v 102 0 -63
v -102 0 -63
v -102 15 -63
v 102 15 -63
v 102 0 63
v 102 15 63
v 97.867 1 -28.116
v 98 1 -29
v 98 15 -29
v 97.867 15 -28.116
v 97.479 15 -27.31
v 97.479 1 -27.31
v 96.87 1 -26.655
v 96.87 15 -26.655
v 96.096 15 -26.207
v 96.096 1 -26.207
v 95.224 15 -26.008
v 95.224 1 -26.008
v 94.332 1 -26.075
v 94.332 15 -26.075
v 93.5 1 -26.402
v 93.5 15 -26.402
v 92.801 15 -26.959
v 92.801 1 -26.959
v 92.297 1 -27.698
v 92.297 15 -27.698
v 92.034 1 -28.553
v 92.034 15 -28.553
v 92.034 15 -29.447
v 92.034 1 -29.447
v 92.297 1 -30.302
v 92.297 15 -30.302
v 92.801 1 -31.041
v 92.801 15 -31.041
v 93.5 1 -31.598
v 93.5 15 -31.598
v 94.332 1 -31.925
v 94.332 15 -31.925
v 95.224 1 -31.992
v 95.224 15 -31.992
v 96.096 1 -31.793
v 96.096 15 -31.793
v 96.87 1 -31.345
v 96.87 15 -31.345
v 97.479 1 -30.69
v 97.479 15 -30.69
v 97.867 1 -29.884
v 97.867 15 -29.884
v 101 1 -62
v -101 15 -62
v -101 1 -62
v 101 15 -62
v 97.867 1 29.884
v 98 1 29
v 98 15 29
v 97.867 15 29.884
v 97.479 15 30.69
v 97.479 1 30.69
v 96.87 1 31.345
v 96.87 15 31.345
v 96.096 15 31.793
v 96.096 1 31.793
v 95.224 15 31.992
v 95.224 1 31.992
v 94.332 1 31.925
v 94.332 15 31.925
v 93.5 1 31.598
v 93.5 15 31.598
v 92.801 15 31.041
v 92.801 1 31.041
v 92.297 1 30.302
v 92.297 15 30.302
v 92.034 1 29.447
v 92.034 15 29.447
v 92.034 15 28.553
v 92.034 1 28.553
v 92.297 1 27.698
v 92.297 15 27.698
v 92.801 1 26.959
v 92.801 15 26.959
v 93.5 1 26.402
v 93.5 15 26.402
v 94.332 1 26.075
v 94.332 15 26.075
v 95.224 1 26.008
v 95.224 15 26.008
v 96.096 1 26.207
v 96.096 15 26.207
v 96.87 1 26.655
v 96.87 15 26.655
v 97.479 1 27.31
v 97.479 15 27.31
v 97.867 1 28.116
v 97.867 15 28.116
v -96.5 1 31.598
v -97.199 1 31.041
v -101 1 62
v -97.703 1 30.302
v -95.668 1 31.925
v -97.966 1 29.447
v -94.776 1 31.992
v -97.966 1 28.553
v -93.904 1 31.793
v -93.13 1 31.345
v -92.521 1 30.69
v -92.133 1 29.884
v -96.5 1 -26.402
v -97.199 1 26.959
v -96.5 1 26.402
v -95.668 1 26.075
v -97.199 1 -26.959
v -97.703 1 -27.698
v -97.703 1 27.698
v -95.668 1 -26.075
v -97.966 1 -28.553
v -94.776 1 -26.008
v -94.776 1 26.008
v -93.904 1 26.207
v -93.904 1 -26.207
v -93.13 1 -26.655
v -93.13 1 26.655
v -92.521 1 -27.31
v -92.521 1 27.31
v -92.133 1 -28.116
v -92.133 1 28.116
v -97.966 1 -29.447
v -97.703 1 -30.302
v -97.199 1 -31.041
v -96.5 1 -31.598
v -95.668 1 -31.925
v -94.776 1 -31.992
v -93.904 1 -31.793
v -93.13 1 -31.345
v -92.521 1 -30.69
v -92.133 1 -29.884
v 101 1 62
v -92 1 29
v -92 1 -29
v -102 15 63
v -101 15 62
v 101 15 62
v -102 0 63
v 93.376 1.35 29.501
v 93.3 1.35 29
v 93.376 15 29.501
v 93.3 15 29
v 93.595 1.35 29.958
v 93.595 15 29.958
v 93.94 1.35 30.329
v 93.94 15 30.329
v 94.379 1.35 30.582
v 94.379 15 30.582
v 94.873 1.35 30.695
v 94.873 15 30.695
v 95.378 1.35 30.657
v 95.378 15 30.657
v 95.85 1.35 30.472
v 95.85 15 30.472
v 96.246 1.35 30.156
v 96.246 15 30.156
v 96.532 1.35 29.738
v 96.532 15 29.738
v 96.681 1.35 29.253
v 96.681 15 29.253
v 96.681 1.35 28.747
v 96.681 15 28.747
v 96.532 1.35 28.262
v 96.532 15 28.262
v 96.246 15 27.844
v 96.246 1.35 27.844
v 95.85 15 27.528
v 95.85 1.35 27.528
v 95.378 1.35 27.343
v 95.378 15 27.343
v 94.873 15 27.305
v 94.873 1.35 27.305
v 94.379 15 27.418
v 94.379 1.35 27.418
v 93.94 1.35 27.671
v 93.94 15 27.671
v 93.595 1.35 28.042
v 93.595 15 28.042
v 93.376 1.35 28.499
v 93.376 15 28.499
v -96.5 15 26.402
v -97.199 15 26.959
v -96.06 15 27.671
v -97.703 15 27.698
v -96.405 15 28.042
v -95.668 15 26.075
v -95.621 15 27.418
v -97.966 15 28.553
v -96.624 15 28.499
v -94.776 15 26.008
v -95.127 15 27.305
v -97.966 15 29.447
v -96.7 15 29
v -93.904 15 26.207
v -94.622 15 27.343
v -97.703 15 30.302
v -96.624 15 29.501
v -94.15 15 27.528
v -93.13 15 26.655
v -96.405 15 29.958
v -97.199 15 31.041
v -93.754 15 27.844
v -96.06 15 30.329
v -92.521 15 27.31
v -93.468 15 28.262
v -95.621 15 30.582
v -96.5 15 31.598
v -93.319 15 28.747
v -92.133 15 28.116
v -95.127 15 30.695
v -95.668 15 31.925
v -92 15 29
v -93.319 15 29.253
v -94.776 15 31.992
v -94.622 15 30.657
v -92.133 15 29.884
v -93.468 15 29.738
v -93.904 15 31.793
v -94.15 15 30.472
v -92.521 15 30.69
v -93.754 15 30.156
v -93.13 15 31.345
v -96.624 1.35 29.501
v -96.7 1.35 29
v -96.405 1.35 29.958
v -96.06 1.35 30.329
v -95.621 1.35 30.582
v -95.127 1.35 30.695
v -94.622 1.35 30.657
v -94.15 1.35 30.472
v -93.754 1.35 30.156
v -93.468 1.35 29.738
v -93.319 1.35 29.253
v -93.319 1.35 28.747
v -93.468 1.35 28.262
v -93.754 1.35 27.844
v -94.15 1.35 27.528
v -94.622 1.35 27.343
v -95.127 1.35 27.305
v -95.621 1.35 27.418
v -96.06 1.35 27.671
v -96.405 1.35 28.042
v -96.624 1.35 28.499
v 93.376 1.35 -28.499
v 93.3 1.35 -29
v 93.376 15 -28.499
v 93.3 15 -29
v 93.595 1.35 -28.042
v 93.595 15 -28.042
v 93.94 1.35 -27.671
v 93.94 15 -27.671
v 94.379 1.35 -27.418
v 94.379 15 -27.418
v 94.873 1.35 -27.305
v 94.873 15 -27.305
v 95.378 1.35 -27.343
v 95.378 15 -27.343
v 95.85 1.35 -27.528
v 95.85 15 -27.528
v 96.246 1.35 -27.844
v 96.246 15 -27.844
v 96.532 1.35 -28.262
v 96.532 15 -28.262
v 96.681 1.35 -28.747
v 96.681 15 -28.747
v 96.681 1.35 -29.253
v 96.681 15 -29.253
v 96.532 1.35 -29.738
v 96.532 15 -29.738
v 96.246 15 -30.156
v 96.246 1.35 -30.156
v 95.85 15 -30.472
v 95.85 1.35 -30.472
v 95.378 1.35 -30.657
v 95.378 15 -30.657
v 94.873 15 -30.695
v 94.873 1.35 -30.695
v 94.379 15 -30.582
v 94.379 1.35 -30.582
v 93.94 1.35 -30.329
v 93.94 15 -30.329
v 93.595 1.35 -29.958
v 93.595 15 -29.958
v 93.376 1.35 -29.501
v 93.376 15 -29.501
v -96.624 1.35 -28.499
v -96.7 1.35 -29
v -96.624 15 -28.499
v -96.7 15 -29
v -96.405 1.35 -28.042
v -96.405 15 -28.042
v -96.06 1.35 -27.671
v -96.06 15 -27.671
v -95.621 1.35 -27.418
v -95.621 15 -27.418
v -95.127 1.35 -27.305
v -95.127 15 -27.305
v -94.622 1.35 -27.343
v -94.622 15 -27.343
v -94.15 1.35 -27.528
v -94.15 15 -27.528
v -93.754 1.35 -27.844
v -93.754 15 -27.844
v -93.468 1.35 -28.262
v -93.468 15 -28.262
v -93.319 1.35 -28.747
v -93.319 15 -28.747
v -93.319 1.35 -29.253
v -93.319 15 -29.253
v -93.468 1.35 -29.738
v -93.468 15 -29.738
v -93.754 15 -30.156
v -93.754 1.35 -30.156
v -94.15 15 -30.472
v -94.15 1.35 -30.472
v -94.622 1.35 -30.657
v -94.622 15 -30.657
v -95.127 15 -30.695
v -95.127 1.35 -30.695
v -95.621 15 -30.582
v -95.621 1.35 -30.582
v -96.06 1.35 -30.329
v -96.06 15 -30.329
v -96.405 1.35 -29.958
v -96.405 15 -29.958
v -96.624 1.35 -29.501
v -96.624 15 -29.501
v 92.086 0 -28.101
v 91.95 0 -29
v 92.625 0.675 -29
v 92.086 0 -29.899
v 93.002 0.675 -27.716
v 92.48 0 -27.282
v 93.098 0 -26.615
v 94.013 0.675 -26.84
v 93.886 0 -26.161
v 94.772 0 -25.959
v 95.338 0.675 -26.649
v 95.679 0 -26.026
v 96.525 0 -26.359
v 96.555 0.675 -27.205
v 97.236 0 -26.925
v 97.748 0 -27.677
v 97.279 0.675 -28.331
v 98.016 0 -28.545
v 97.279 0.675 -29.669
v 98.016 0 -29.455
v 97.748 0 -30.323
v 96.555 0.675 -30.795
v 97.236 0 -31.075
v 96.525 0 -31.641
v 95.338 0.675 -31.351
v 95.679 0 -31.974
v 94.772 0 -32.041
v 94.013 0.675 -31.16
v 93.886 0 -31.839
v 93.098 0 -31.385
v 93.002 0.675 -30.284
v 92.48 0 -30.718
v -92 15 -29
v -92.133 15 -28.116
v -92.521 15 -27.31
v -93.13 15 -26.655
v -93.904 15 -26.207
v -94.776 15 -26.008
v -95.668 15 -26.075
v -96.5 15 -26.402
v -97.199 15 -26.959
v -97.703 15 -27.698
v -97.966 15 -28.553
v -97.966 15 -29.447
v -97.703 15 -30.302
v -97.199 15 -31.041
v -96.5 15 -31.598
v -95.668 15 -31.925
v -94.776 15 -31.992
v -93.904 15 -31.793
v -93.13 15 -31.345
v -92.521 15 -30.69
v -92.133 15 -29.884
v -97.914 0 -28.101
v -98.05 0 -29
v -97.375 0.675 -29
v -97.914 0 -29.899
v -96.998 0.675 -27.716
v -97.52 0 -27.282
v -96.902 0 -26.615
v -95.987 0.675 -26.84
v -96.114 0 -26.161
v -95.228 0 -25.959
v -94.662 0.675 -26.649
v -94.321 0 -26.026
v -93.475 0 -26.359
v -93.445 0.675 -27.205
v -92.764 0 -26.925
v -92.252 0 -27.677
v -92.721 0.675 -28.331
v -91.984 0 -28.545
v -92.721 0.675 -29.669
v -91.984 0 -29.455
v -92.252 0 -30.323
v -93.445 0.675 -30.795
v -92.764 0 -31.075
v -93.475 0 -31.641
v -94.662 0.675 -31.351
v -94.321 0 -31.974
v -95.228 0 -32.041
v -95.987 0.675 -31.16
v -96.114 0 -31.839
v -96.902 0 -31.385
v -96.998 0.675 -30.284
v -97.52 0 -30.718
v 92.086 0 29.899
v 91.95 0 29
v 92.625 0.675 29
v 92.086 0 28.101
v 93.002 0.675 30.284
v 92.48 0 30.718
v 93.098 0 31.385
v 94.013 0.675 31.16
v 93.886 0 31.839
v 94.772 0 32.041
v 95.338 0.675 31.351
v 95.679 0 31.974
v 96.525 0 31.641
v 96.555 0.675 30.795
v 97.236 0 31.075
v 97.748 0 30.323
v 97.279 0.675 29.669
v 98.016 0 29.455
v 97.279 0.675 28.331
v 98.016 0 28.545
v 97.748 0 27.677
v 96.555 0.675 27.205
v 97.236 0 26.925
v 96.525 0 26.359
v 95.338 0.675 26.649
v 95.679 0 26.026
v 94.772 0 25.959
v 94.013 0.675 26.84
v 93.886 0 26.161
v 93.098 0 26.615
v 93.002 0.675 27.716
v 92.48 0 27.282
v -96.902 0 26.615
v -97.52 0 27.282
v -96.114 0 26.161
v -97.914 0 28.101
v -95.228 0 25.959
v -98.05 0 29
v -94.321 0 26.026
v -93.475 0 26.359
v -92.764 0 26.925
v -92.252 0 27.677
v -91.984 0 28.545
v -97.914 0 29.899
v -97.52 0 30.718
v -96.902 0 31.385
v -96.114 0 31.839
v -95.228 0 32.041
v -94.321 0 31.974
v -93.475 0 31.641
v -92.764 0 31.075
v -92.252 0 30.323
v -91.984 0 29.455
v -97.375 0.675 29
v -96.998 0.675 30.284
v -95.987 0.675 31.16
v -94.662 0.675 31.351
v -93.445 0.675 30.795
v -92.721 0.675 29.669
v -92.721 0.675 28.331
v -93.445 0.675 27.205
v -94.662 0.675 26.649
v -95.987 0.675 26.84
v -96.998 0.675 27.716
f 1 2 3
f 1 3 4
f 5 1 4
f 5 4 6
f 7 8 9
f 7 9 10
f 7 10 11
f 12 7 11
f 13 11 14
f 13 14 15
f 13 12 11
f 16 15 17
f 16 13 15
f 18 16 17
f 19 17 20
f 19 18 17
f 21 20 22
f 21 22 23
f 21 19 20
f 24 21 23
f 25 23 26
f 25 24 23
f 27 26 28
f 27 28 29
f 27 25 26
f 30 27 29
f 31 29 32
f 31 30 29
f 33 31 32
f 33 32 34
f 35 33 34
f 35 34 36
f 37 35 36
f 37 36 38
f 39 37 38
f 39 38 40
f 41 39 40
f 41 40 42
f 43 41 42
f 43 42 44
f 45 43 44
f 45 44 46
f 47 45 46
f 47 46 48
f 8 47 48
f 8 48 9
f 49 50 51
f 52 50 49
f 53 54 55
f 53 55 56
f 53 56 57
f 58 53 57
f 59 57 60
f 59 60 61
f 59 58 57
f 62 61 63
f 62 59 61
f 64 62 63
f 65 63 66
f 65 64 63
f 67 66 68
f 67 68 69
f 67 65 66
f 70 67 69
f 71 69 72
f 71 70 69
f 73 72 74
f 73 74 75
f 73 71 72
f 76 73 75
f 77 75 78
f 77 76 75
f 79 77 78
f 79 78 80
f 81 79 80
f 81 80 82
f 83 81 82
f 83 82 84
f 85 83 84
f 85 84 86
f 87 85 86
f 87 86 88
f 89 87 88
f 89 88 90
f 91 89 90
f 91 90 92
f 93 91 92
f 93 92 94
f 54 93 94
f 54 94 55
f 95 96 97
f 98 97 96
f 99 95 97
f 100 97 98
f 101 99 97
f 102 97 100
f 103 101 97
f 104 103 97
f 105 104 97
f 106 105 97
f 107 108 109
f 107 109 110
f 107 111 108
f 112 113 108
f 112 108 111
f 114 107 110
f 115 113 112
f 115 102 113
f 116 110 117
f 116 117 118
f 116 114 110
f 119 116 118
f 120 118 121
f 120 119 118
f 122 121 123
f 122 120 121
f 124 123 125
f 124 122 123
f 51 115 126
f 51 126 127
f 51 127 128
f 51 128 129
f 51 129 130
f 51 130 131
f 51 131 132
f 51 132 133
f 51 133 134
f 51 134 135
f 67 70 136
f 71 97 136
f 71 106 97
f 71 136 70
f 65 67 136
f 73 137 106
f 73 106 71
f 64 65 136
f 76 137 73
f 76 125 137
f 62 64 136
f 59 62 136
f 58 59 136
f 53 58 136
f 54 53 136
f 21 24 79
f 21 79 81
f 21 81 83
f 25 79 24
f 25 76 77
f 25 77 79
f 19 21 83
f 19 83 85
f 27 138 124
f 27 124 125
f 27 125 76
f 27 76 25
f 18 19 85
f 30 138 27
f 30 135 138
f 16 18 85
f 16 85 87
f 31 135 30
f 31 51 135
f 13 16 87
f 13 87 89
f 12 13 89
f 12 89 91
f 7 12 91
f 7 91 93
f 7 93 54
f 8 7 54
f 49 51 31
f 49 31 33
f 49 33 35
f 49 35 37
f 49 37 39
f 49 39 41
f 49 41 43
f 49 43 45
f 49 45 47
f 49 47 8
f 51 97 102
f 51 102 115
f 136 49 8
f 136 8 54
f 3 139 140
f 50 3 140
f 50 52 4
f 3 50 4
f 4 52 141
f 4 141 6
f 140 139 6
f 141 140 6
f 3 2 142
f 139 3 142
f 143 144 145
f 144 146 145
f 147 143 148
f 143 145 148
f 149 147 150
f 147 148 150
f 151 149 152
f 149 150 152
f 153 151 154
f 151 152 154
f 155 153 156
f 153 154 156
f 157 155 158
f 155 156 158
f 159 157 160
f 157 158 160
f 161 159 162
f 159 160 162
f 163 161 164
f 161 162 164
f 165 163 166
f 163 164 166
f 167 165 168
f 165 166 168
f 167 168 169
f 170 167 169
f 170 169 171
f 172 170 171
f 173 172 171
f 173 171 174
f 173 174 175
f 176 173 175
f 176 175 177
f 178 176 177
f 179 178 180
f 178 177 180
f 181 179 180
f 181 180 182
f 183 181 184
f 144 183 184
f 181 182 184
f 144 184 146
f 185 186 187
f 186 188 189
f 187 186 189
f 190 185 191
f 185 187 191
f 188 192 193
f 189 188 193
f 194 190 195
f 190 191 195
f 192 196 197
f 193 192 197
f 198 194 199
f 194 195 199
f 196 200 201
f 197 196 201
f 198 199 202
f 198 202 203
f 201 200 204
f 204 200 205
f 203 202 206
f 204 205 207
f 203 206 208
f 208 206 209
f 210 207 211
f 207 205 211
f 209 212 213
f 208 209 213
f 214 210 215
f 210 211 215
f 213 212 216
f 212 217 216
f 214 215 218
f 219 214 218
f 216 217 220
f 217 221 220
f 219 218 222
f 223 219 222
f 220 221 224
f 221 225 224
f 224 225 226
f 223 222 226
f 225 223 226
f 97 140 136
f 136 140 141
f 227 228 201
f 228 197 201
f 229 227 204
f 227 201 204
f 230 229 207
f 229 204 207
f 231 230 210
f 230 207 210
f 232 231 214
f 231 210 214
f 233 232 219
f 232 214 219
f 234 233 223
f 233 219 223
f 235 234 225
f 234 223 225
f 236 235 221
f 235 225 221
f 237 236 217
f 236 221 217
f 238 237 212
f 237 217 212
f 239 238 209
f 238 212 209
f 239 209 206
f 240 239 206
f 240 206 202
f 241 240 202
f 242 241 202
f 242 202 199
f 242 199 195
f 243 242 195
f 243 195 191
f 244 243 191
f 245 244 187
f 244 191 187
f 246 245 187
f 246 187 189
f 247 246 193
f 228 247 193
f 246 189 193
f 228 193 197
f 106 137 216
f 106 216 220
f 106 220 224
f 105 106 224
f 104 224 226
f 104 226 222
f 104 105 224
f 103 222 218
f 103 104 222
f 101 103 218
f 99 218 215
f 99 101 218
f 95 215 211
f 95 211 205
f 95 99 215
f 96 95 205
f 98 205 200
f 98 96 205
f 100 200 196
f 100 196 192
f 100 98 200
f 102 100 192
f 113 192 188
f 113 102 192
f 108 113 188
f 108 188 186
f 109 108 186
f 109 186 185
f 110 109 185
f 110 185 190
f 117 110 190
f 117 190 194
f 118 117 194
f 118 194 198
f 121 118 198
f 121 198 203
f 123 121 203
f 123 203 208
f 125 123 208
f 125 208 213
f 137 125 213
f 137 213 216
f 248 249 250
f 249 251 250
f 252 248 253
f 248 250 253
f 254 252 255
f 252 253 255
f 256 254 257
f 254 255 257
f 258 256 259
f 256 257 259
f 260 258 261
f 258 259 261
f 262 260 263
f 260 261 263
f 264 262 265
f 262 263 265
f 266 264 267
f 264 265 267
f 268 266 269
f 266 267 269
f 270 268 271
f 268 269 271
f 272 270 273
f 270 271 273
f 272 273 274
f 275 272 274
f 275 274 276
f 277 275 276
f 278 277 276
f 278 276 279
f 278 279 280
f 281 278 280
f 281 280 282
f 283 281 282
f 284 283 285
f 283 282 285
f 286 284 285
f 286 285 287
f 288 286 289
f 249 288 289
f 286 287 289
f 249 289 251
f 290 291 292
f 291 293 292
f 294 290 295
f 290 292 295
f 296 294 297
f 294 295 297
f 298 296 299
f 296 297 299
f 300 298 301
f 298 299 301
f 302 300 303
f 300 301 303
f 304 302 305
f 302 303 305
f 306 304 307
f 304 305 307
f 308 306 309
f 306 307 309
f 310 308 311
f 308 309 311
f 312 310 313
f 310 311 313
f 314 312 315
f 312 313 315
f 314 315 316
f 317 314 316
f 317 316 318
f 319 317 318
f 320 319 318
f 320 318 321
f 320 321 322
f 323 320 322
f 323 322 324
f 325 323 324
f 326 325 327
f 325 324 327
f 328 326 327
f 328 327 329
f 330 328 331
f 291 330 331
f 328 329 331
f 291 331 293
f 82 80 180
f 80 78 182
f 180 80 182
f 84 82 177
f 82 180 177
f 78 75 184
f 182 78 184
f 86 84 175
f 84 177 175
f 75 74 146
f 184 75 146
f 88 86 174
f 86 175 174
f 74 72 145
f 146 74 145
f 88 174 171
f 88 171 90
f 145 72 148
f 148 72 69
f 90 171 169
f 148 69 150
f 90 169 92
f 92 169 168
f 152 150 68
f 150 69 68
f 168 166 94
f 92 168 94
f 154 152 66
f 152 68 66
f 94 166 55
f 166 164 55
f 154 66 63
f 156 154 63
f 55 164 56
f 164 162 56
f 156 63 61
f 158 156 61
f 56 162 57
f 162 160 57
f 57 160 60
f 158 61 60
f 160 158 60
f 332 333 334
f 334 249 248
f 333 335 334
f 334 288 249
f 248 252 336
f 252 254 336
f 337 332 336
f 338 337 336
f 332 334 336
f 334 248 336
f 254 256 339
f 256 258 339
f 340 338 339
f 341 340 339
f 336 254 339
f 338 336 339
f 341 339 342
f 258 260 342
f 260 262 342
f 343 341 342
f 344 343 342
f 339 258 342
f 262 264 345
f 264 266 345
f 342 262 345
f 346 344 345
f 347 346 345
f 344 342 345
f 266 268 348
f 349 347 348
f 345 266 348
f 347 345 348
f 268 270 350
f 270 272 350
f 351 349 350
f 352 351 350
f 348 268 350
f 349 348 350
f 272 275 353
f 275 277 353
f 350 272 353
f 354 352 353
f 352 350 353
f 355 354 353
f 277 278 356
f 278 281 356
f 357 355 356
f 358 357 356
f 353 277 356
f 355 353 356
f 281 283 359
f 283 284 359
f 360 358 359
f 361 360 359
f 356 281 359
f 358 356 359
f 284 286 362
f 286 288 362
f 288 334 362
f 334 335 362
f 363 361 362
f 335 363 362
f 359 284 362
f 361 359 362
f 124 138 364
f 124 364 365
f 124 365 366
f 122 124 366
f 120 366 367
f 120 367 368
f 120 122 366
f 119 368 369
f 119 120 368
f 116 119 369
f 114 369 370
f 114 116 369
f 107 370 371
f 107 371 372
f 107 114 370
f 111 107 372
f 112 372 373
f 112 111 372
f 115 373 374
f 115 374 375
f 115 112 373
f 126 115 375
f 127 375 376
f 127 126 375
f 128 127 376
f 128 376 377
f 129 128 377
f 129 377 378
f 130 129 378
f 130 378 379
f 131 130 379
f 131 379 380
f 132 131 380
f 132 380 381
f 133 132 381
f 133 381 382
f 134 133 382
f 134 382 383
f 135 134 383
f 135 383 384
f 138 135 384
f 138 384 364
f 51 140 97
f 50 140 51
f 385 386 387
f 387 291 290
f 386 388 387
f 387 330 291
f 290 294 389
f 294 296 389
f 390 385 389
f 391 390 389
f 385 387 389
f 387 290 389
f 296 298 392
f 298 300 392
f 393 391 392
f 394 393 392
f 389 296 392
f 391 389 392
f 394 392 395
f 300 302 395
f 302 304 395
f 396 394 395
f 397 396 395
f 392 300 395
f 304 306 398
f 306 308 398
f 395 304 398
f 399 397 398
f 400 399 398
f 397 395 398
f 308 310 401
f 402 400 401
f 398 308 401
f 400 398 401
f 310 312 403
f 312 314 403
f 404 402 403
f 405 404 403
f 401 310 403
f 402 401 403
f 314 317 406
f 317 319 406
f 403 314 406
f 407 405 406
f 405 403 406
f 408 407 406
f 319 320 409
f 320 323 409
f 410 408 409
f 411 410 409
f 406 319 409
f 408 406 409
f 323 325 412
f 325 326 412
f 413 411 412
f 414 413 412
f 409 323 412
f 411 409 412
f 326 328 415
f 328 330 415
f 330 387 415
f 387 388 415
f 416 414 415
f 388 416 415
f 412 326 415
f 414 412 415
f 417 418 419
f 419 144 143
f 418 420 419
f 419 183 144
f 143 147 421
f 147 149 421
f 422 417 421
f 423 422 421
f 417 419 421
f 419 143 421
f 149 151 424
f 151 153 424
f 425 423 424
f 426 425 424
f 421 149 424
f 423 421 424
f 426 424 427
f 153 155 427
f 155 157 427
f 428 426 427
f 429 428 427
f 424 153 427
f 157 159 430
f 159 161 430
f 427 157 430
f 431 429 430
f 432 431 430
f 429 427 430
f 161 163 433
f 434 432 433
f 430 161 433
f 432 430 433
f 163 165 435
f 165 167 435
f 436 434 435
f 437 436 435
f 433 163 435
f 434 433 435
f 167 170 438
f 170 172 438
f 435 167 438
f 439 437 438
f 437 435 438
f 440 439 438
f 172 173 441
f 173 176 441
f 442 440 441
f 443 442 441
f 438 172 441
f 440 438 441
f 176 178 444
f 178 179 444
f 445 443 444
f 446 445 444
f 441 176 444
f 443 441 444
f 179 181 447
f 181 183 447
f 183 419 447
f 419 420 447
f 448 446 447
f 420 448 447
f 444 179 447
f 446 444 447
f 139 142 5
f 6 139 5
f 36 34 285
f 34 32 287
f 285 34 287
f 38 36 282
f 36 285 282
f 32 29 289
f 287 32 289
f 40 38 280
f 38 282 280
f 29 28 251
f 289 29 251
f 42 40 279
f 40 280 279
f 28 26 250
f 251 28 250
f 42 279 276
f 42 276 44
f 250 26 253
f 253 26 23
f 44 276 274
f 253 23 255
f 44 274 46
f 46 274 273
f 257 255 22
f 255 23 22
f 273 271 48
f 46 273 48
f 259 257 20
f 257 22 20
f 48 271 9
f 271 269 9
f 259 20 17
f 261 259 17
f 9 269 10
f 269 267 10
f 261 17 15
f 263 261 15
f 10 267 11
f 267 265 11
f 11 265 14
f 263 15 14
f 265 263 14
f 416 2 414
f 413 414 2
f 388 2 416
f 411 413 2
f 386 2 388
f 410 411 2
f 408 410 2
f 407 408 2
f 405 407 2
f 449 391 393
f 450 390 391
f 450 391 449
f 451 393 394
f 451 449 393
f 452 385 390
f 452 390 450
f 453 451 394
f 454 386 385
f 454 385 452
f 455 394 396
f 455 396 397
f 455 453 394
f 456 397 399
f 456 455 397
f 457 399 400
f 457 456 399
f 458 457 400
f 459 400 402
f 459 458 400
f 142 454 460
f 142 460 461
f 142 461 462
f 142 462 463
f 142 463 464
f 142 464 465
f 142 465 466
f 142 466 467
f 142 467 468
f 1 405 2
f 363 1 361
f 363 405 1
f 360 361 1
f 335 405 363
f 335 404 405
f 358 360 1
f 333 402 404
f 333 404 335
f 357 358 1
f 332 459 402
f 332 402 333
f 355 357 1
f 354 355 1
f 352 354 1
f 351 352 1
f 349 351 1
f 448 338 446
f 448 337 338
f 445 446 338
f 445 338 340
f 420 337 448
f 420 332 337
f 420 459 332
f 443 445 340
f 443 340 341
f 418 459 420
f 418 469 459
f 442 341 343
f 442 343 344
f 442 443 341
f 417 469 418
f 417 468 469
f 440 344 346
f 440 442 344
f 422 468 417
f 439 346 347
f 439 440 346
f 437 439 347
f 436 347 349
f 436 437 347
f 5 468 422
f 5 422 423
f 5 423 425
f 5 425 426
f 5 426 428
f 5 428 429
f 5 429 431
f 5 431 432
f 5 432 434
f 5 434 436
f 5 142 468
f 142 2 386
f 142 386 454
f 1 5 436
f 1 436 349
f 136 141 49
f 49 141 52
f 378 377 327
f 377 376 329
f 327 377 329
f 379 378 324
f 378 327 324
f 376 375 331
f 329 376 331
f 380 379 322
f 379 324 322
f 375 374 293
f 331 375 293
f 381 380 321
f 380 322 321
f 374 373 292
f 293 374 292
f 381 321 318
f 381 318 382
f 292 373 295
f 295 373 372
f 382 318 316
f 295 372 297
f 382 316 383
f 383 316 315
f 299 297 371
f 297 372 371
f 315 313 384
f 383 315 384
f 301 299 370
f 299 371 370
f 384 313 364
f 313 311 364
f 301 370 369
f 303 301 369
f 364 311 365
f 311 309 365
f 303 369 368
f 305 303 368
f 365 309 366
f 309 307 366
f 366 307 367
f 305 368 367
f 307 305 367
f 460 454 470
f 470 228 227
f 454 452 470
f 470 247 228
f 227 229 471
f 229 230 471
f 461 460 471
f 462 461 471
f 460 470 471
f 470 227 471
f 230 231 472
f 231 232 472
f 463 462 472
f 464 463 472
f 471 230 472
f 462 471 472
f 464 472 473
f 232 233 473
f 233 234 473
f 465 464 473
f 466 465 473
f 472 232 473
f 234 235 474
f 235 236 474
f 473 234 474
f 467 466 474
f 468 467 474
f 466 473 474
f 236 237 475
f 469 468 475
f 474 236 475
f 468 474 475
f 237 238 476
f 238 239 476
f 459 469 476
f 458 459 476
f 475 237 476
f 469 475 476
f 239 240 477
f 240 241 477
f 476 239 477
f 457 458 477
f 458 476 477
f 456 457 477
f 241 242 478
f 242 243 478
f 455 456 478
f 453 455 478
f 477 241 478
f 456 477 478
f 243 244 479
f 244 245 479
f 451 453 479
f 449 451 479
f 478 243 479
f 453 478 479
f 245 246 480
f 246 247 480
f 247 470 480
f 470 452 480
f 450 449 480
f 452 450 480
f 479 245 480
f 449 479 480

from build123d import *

# Parameters (mm, degrees)
SKETCH_W         = 204
SKETCH_H         = 126
PAD_DEPTH        = 15
SKETCH001_W      = 202
SKETCH001_H      = 124
POCKET_DEPTH     = 14
SKETCH002_R      = 3
PAD001_DEPTH     = 15
HOLE_D           = 3.4
HOLE_DEPTH       = 25
HOLE_CSINK_D     = 6.1
HOLE_CSINK_ANGLE = 90


with BuildPart() as part:
    # Sketch → Pad (new body)
    with BuildSketch(Plane.XZ):
        Rectangle(SKETCH_W, SKETCH_H)
    extrude(amount=-PAD_DEPTH)

    # Sketch001 (on Face6 of Pad) → Pocket (cut)
    with BuildSketch(Plane(origin=(0, 15, 0), x_dir=(1, 0, 0), z_dir=(0, 1, 0))):
        Rectangle(SKETCH001_W, SKETCH001_H)
    extrude(amount=-POCKET_DEPTH, mode=Mode.SUBTRACT)

    # Sketch002 (on Face4 of Pocket) → Pad001 (join)
    with BuildSketch(Plane.XZ):
        with Locations((-95, 29)):
            Circle(SKETCH002_R)
        with Locations((95, 29)):
            Circle(SKETCH002_R)
        with Locations((95, -29)):
            Circle(SKETCH002_R)
        with Locations((-95, -29)):
            Circle(SKETCH002_R)
    extrude(amount=-PAD001_DEPTH)

    # Hole
    with Locations(Plane.XZ):
        with Locations((-95, 29), (95, 29), (95, -29), (-95, -29)):
            CounterSinkHole(HOLE_D / 2, HOLE_CSINK_D / 2, depth=HOLE_DEPTH, counter_sink_angle=HOLE_CSINK_ANGLE)


solid = part.part
